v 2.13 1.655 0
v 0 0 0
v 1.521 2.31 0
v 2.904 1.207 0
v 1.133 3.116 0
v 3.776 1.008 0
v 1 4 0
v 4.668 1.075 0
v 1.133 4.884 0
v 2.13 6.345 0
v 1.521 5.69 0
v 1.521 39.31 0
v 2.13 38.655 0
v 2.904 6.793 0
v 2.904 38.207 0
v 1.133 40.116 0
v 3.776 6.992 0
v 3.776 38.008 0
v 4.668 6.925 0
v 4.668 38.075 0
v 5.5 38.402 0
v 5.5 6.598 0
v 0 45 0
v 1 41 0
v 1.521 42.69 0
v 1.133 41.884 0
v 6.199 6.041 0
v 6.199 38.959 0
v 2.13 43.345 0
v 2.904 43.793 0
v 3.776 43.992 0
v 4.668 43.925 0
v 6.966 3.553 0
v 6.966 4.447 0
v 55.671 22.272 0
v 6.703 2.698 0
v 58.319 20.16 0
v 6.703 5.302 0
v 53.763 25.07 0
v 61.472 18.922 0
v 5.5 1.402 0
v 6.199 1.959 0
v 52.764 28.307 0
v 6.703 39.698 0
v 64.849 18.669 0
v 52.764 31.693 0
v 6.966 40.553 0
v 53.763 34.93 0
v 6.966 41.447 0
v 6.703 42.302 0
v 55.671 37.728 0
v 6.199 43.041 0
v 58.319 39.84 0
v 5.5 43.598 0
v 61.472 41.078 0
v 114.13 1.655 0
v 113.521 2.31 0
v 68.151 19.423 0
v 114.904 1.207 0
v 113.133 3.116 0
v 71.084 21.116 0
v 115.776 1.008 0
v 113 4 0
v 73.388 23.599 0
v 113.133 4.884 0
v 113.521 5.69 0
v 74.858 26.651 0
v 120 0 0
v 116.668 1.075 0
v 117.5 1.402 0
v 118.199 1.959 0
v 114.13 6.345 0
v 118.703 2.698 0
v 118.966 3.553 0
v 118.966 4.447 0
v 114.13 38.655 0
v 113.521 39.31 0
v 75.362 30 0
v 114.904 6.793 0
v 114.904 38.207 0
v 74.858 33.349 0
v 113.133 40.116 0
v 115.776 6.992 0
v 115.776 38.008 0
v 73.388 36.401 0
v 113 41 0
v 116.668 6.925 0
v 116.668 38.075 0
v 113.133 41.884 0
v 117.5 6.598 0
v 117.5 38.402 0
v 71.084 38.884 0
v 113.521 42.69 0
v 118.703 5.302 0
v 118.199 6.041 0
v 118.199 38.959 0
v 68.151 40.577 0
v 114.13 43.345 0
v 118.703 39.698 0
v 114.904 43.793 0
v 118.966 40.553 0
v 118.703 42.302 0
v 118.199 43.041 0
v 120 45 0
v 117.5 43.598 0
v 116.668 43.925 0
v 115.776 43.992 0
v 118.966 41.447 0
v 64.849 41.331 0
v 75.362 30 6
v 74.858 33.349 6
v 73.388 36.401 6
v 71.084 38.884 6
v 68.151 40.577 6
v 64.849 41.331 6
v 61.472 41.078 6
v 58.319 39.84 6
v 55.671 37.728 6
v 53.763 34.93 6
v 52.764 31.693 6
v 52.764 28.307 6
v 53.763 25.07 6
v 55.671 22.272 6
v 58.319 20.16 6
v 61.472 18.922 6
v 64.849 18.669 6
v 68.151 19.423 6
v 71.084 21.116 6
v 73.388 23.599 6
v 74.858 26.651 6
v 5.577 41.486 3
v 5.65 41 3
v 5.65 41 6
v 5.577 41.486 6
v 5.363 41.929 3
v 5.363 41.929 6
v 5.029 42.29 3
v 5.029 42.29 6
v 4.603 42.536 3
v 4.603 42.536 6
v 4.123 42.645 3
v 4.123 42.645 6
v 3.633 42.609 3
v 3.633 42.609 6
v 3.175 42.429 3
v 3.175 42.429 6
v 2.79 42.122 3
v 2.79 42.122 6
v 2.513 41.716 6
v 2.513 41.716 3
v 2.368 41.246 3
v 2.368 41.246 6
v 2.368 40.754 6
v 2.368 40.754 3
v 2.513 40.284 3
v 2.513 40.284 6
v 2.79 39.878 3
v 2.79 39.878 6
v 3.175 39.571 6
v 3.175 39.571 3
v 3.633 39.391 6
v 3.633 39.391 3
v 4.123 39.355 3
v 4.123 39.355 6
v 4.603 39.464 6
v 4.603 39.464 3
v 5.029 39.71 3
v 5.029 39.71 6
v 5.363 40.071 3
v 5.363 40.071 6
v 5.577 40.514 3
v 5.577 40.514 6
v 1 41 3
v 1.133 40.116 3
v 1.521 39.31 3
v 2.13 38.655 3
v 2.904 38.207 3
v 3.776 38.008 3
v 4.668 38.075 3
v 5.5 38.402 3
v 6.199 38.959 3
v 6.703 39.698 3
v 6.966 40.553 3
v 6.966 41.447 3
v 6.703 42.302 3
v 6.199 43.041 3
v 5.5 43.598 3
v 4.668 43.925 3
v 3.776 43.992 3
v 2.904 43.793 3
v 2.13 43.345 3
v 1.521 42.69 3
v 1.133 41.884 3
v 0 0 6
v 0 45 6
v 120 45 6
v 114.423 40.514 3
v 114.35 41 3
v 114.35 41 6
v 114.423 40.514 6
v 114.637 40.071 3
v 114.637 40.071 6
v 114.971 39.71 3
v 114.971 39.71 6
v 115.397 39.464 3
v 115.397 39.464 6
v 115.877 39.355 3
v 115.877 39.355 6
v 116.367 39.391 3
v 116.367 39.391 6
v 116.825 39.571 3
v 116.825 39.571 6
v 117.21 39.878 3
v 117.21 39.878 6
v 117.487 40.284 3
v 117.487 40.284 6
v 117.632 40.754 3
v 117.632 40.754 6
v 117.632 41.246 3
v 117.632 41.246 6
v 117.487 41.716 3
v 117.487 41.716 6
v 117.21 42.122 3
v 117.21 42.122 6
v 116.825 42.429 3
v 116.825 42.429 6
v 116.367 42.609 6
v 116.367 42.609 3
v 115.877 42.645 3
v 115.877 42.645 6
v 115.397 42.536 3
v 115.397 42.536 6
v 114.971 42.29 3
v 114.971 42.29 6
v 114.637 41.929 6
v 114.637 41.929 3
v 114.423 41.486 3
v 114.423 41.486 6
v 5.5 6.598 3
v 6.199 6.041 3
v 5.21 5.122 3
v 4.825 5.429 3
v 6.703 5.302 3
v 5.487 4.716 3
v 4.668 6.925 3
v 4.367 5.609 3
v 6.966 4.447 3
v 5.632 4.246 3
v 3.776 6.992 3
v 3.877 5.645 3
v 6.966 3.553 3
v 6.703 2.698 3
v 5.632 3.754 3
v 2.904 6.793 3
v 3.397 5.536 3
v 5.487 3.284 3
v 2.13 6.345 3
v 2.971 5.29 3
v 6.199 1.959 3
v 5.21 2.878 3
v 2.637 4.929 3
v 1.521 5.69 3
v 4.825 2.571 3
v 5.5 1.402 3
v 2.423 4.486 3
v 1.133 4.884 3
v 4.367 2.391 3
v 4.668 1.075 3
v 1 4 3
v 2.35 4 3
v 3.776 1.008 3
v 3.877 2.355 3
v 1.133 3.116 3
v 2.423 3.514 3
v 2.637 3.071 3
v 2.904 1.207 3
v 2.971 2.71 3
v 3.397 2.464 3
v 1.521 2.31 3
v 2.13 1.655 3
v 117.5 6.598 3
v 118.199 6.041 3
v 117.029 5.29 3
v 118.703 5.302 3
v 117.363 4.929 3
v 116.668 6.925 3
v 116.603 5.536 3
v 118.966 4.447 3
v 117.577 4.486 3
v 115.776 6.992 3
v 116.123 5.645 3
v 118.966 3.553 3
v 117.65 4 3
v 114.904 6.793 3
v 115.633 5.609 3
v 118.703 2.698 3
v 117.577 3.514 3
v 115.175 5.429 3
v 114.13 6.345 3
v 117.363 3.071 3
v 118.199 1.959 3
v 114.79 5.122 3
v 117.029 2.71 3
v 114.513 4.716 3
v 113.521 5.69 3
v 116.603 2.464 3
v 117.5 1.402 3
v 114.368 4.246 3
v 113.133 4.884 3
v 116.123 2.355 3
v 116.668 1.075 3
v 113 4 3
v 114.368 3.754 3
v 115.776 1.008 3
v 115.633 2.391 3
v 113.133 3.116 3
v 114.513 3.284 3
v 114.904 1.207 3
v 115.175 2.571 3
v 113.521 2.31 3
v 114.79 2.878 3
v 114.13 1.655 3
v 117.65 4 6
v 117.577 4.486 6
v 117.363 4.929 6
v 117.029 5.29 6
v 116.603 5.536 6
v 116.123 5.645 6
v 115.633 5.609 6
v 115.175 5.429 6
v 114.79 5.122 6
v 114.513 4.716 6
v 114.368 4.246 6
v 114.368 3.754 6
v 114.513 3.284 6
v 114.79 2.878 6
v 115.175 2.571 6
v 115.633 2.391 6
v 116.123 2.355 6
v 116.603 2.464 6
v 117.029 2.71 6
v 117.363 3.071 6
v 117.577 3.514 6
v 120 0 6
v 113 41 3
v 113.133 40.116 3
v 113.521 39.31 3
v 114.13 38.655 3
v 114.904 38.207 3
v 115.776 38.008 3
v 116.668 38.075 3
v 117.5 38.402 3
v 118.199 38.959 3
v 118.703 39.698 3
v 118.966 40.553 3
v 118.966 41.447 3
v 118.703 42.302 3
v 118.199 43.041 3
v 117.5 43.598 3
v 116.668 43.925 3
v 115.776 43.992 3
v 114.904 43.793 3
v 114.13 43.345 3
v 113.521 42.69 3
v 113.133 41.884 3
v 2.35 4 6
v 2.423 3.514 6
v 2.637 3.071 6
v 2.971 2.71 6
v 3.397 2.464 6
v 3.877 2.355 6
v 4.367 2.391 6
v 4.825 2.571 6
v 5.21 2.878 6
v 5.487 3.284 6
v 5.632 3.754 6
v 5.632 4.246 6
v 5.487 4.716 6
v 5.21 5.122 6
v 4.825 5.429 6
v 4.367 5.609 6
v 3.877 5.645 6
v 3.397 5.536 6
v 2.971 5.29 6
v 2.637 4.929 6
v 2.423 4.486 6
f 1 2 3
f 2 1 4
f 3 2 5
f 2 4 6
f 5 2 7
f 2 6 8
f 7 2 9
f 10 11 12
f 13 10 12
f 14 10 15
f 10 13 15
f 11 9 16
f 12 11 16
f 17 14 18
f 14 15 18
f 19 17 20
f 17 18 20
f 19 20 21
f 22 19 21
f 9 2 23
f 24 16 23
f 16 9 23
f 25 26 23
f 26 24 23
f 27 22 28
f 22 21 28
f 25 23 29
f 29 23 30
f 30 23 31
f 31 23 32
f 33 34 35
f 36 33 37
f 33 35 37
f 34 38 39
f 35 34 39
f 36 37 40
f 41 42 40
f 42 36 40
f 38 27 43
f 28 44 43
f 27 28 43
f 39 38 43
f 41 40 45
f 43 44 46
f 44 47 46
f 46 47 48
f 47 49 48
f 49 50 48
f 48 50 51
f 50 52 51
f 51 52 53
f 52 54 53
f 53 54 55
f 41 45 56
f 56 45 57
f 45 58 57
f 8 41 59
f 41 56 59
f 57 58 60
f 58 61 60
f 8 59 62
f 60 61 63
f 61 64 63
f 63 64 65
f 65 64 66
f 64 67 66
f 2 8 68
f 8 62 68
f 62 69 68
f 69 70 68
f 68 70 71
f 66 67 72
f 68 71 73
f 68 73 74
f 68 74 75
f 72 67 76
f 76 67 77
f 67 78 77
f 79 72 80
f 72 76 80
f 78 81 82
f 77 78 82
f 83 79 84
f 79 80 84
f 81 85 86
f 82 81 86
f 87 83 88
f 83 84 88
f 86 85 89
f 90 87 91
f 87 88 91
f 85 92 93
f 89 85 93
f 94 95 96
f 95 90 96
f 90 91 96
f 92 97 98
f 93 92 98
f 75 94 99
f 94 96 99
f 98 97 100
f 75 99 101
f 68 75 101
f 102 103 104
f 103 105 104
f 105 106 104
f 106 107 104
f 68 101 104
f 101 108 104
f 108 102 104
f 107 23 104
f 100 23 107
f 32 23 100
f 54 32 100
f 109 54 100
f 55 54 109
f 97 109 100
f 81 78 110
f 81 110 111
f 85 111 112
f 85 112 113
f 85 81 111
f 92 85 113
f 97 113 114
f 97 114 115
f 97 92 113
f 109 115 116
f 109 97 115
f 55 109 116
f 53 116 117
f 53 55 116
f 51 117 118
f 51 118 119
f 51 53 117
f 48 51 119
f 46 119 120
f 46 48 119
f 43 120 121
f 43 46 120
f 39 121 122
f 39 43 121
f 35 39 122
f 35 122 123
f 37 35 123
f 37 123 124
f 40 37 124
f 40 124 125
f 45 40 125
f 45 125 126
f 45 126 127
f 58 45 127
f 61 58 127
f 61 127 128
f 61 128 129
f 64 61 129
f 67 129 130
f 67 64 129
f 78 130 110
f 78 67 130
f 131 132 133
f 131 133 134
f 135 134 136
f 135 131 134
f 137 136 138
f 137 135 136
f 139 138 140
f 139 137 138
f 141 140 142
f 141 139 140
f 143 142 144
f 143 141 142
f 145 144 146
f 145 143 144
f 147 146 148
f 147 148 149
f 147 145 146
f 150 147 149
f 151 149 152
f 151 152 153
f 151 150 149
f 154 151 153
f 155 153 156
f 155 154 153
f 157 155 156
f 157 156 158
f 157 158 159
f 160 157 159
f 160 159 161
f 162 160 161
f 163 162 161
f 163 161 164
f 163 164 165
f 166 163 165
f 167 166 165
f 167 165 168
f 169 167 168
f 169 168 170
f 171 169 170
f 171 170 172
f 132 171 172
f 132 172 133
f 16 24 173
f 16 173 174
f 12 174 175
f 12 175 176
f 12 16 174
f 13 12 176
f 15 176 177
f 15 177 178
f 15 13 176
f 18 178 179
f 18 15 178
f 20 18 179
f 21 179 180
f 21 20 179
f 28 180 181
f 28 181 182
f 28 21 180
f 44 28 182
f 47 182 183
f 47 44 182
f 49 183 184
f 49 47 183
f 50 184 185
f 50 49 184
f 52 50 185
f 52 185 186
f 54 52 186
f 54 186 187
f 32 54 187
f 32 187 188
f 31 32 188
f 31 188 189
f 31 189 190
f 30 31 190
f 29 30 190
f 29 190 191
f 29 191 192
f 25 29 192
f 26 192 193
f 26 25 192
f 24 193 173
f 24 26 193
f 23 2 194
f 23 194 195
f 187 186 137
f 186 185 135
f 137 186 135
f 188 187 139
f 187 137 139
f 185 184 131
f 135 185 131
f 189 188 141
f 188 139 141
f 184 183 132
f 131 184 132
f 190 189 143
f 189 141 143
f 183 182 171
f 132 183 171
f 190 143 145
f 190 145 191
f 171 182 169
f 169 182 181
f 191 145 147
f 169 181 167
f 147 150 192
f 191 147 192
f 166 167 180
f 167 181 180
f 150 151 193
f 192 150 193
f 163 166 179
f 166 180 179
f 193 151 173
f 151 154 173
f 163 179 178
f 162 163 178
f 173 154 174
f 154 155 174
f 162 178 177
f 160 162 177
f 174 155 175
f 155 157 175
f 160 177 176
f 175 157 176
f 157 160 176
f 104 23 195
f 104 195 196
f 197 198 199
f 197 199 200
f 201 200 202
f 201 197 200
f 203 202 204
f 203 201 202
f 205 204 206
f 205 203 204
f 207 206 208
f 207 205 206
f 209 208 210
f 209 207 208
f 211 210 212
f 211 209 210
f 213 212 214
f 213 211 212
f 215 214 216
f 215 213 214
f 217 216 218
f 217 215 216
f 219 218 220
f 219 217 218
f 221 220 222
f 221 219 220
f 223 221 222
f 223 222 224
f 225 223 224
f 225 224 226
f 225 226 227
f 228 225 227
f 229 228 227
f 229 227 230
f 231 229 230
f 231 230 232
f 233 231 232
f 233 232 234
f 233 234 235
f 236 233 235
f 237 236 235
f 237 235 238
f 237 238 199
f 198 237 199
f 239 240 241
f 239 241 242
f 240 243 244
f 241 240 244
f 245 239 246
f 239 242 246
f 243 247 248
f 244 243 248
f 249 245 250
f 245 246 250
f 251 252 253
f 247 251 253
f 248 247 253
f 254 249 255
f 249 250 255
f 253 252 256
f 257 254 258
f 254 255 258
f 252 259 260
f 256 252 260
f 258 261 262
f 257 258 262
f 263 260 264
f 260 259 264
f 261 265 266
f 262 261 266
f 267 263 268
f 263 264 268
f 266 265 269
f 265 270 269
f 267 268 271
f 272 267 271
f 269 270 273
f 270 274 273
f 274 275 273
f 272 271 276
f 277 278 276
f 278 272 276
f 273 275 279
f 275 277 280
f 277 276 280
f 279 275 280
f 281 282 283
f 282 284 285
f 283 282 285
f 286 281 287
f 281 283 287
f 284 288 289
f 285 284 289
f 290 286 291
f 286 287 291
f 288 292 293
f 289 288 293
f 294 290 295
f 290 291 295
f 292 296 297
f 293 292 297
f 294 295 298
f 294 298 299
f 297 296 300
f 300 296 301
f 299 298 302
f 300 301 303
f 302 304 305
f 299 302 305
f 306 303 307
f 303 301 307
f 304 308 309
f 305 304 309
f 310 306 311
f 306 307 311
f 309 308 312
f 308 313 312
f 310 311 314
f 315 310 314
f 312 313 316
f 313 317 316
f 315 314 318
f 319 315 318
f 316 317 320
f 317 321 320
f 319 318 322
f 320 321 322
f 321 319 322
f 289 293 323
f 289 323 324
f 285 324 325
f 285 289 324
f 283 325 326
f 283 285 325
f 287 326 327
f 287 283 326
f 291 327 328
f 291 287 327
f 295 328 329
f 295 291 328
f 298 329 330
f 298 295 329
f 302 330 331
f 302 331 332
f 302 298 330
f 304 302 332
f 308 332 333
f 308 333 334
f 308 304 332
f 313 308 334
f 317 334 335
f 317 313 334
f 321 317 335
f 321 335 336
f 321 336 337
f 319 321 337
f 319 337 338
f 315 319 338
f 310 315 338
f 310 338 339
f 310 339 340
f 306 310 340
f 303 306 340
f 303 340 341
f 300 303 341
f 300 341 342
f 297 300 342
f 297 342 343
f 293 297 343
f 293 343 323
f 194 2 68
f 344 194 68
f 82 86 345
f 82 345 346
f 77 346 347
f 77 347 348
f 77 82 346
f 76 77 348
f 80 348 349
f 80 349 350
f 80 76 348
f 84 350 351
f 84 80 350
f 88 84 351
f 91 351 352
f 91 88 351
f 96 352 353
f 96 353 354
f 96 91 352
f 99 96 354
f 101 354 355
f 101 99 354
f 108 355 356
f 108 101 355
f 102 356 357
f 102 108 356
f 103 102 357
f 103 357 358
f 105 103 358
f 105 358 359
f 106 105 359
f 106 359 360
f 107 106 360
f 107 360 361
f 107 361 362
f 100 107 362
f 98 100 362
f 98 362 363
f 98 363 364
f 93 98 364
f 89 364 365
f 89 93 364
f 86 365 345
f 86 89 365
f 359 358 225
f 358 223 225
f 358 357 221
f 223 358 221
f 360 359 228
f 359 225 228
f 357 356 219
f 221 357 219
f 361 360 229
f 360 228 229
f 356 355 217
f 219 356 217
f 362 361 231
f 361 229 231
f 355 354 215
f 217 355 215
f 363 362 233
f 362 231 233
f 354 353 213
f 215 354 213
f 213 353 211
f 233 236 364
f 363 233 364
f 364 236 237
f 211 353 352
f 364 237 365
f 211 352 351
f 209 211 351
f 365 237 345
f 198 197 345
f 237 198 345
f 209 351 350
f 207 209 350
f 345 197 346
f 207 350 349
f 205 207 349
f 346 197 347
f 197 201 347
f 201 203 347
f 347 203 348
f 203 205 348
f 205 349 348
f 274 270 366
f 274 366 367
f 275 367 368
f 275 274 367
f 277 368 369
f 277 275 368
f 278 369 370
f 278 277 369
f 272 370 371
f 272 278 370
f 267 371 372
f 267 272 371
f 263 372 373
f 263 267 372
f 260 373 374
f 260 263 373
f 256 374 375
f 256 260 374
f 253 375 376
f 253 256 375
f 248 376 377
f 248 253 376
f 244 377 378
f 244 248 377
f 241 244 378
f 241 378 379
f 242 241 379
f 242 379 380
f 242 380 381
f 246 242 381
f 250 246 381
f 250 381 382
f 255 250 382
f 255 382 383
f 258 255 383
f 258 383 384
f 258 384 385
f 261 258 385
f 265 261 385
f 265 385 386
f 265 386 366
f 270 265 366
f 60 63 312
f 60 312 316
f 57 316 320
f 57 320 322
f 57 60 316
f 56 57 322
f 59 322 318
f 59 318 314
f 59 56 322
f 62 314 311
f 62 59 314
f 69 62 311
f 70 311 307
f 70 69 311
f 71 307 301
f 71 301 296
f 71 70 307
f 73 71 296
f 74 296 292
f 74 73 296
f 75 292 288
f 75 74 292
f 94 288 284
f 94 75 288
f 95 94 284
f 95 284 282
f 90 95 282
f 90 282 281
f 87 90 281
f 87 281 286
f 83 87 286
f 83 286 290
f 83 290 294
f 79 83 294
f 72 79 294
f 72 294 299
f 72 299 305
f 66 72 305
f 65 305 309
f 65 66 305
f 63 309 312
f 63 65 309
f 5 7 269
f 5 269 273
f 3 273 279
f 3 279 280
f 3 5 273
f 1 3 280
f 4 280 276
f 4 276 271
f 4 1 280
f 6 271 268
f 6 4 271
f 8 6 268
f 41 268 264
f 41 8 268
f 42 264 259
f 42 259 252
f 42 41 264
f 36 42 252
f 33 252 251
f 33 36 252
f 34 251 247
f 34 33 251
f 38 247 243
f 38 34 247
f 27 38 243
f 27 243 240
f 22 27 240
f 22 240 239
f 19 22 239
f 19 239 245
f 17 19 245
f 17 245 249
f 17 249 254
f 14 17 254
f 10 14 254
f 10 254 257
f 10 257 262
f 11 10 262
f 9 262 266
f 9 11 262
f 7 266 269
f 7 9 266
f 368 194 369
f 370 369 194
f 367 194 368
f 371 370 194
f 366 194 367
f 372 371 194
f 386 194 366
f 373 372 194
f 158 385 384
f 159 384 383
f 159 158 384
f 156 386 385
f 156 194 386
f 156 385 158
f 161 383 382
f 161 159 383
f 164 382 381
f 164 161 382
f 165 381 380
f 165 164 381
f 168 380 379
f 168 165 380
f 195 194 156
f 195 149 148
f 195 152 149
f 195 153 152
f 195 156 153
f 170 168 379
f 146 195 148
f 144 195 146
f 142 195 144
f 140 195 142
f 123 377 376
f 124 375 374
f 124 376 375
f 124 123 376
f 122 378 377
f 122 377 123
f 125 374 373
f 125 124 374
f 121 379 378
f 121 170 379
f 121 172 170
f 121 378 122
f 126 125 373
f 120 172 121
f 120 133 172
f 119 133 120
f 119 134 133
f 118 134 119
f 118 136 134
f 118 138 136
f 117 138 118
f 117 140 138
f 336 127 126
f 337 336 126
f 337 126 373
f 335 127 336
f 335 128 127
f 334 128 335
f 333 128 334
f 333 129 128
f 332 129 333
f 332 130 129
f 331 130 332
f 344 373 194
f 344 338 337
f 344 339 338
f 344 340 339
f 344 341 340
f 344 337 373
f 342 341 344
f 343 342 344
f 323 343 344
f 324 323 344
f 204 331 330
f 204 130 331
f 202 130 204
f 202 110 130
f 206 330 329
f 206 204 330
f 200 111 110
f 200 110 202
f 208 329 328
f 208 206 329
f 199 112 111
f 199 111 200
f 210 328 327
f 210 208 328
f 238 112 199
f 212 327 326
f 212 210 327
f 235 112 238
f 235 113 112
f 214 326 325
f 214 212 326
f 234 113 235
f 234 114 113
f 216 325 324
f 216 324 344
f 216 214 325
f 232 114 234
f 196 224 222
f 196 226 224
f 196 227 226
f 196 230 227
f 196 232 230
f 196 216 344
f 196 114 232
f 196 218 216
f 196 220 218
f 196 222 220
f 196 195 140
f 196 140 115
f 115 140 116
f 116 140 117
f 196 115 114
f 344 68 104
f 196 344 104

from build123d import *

# Parameters (mm, degrees)
SKETCH1_W           = 120
SKETCH1_H           = 45
SKETCH1_R           = 11.3625
SKETCH1_R_2         = 1.65
BOSS_EXTRUDE1_DEPTH = 6
CUT_EXTRUDE1_START  = -6
SKETCH2_R           = 3
SKETCH2_R_2         = 1.65
CUT_EXTRUDE1_DEPTH  = 3


with BuildPart() as part:
    # Sketch1 → Boss-Extrude1 (new body)
    with BuildSketch(Plane.XY):
        with Locations((60, 22.5)):
            Rectangle(SKETCH1_W, SKETCH1_H)
        with Locations((64, 30)):
            Circle(SKETCH1_R, mode=Mode.SUBTRACT)
        with Locations((4, 41)):
            Circle(SKETCH1_R_2, mode=Mode.SUBTRACT)
        with Locations(Location((4, 4, 0), (0, 0, 180))):
            Circle(SKETCH1_R_2, mode=Mode.SUBTRACT)
        with Locations(Location((116, 41, 0), (0, 0, 180))):
            Circle(SKETCH1_R_2, mode=Mode.SUBTRACT)
        with Locations((116, 4)):
            Circle(SKETCH1_R_2, mode=Mode.SUBTRACT)
    extrude(amount=BOSS_EXTRUDE1_DEPTH)

    # Sketch2 → Cut-Extrude1 (cut)
    # profile 1 of 4: a face of its own
    with BuildSketch(Plane.XY.offset(6).offset(CUT_EXTRUDE1_START)):
        with Locations(Location((4, 41, 0), (0, 0, 180))):
            Circle(SKETCH2_R)
        with Locations(Location((4, 41, 0), (0, 0, 180))):
            Circle(SKETCH2_R_2, mode=Mode.SUBTRACT)
    # profile 2 of 4: a face of its own
    with BuildSketch(Plane.XY.offset(6).offset(CUT_EXTRUDE1_START)):
        with Locations(Location((4, 4, 0), (0, 0, 180))):
            Circle(SKETCH2_R)
        with Locations(Location((4, 4, 0), (0, 0, 180))):
            Circle(SKETCH2_R_2, mode=Mode.SUBTRACT)
    # profile 3 of 4: a face of its own
    with BuildSketch(Plane.XY.offset(6).offset(CUT_EXTRUDE1_START)):
        with Locations(Location((116, 4, 0), (0, 0, 180))):
            Circle(SKETCH2_R)
        with Locations(Location((116, 4, 0), (0, 0, 180))):
            Circle(SKETCH2_R_2, mode=Mode.SUBTRACT)
    # profile 4 of 4: a face of its own
    with BuildSketch(Plane.XY.offset(6).offset(CUT_EXTRUDE1_START)):
        with Locations(Location((116, 41, 0), (0, 0, 180))):
            Circle(SKETCH2_R)
        with Locations(Location((116, 41, 0), (0, 0, 180))):
            Circle(SKETCH2_R_2, mode=Mode.SUBTRACT)
    extrude(amount=CUT_EXTRUDE1_DEPTH, mode=Mode.SUBTRACT)


solid = part.part
